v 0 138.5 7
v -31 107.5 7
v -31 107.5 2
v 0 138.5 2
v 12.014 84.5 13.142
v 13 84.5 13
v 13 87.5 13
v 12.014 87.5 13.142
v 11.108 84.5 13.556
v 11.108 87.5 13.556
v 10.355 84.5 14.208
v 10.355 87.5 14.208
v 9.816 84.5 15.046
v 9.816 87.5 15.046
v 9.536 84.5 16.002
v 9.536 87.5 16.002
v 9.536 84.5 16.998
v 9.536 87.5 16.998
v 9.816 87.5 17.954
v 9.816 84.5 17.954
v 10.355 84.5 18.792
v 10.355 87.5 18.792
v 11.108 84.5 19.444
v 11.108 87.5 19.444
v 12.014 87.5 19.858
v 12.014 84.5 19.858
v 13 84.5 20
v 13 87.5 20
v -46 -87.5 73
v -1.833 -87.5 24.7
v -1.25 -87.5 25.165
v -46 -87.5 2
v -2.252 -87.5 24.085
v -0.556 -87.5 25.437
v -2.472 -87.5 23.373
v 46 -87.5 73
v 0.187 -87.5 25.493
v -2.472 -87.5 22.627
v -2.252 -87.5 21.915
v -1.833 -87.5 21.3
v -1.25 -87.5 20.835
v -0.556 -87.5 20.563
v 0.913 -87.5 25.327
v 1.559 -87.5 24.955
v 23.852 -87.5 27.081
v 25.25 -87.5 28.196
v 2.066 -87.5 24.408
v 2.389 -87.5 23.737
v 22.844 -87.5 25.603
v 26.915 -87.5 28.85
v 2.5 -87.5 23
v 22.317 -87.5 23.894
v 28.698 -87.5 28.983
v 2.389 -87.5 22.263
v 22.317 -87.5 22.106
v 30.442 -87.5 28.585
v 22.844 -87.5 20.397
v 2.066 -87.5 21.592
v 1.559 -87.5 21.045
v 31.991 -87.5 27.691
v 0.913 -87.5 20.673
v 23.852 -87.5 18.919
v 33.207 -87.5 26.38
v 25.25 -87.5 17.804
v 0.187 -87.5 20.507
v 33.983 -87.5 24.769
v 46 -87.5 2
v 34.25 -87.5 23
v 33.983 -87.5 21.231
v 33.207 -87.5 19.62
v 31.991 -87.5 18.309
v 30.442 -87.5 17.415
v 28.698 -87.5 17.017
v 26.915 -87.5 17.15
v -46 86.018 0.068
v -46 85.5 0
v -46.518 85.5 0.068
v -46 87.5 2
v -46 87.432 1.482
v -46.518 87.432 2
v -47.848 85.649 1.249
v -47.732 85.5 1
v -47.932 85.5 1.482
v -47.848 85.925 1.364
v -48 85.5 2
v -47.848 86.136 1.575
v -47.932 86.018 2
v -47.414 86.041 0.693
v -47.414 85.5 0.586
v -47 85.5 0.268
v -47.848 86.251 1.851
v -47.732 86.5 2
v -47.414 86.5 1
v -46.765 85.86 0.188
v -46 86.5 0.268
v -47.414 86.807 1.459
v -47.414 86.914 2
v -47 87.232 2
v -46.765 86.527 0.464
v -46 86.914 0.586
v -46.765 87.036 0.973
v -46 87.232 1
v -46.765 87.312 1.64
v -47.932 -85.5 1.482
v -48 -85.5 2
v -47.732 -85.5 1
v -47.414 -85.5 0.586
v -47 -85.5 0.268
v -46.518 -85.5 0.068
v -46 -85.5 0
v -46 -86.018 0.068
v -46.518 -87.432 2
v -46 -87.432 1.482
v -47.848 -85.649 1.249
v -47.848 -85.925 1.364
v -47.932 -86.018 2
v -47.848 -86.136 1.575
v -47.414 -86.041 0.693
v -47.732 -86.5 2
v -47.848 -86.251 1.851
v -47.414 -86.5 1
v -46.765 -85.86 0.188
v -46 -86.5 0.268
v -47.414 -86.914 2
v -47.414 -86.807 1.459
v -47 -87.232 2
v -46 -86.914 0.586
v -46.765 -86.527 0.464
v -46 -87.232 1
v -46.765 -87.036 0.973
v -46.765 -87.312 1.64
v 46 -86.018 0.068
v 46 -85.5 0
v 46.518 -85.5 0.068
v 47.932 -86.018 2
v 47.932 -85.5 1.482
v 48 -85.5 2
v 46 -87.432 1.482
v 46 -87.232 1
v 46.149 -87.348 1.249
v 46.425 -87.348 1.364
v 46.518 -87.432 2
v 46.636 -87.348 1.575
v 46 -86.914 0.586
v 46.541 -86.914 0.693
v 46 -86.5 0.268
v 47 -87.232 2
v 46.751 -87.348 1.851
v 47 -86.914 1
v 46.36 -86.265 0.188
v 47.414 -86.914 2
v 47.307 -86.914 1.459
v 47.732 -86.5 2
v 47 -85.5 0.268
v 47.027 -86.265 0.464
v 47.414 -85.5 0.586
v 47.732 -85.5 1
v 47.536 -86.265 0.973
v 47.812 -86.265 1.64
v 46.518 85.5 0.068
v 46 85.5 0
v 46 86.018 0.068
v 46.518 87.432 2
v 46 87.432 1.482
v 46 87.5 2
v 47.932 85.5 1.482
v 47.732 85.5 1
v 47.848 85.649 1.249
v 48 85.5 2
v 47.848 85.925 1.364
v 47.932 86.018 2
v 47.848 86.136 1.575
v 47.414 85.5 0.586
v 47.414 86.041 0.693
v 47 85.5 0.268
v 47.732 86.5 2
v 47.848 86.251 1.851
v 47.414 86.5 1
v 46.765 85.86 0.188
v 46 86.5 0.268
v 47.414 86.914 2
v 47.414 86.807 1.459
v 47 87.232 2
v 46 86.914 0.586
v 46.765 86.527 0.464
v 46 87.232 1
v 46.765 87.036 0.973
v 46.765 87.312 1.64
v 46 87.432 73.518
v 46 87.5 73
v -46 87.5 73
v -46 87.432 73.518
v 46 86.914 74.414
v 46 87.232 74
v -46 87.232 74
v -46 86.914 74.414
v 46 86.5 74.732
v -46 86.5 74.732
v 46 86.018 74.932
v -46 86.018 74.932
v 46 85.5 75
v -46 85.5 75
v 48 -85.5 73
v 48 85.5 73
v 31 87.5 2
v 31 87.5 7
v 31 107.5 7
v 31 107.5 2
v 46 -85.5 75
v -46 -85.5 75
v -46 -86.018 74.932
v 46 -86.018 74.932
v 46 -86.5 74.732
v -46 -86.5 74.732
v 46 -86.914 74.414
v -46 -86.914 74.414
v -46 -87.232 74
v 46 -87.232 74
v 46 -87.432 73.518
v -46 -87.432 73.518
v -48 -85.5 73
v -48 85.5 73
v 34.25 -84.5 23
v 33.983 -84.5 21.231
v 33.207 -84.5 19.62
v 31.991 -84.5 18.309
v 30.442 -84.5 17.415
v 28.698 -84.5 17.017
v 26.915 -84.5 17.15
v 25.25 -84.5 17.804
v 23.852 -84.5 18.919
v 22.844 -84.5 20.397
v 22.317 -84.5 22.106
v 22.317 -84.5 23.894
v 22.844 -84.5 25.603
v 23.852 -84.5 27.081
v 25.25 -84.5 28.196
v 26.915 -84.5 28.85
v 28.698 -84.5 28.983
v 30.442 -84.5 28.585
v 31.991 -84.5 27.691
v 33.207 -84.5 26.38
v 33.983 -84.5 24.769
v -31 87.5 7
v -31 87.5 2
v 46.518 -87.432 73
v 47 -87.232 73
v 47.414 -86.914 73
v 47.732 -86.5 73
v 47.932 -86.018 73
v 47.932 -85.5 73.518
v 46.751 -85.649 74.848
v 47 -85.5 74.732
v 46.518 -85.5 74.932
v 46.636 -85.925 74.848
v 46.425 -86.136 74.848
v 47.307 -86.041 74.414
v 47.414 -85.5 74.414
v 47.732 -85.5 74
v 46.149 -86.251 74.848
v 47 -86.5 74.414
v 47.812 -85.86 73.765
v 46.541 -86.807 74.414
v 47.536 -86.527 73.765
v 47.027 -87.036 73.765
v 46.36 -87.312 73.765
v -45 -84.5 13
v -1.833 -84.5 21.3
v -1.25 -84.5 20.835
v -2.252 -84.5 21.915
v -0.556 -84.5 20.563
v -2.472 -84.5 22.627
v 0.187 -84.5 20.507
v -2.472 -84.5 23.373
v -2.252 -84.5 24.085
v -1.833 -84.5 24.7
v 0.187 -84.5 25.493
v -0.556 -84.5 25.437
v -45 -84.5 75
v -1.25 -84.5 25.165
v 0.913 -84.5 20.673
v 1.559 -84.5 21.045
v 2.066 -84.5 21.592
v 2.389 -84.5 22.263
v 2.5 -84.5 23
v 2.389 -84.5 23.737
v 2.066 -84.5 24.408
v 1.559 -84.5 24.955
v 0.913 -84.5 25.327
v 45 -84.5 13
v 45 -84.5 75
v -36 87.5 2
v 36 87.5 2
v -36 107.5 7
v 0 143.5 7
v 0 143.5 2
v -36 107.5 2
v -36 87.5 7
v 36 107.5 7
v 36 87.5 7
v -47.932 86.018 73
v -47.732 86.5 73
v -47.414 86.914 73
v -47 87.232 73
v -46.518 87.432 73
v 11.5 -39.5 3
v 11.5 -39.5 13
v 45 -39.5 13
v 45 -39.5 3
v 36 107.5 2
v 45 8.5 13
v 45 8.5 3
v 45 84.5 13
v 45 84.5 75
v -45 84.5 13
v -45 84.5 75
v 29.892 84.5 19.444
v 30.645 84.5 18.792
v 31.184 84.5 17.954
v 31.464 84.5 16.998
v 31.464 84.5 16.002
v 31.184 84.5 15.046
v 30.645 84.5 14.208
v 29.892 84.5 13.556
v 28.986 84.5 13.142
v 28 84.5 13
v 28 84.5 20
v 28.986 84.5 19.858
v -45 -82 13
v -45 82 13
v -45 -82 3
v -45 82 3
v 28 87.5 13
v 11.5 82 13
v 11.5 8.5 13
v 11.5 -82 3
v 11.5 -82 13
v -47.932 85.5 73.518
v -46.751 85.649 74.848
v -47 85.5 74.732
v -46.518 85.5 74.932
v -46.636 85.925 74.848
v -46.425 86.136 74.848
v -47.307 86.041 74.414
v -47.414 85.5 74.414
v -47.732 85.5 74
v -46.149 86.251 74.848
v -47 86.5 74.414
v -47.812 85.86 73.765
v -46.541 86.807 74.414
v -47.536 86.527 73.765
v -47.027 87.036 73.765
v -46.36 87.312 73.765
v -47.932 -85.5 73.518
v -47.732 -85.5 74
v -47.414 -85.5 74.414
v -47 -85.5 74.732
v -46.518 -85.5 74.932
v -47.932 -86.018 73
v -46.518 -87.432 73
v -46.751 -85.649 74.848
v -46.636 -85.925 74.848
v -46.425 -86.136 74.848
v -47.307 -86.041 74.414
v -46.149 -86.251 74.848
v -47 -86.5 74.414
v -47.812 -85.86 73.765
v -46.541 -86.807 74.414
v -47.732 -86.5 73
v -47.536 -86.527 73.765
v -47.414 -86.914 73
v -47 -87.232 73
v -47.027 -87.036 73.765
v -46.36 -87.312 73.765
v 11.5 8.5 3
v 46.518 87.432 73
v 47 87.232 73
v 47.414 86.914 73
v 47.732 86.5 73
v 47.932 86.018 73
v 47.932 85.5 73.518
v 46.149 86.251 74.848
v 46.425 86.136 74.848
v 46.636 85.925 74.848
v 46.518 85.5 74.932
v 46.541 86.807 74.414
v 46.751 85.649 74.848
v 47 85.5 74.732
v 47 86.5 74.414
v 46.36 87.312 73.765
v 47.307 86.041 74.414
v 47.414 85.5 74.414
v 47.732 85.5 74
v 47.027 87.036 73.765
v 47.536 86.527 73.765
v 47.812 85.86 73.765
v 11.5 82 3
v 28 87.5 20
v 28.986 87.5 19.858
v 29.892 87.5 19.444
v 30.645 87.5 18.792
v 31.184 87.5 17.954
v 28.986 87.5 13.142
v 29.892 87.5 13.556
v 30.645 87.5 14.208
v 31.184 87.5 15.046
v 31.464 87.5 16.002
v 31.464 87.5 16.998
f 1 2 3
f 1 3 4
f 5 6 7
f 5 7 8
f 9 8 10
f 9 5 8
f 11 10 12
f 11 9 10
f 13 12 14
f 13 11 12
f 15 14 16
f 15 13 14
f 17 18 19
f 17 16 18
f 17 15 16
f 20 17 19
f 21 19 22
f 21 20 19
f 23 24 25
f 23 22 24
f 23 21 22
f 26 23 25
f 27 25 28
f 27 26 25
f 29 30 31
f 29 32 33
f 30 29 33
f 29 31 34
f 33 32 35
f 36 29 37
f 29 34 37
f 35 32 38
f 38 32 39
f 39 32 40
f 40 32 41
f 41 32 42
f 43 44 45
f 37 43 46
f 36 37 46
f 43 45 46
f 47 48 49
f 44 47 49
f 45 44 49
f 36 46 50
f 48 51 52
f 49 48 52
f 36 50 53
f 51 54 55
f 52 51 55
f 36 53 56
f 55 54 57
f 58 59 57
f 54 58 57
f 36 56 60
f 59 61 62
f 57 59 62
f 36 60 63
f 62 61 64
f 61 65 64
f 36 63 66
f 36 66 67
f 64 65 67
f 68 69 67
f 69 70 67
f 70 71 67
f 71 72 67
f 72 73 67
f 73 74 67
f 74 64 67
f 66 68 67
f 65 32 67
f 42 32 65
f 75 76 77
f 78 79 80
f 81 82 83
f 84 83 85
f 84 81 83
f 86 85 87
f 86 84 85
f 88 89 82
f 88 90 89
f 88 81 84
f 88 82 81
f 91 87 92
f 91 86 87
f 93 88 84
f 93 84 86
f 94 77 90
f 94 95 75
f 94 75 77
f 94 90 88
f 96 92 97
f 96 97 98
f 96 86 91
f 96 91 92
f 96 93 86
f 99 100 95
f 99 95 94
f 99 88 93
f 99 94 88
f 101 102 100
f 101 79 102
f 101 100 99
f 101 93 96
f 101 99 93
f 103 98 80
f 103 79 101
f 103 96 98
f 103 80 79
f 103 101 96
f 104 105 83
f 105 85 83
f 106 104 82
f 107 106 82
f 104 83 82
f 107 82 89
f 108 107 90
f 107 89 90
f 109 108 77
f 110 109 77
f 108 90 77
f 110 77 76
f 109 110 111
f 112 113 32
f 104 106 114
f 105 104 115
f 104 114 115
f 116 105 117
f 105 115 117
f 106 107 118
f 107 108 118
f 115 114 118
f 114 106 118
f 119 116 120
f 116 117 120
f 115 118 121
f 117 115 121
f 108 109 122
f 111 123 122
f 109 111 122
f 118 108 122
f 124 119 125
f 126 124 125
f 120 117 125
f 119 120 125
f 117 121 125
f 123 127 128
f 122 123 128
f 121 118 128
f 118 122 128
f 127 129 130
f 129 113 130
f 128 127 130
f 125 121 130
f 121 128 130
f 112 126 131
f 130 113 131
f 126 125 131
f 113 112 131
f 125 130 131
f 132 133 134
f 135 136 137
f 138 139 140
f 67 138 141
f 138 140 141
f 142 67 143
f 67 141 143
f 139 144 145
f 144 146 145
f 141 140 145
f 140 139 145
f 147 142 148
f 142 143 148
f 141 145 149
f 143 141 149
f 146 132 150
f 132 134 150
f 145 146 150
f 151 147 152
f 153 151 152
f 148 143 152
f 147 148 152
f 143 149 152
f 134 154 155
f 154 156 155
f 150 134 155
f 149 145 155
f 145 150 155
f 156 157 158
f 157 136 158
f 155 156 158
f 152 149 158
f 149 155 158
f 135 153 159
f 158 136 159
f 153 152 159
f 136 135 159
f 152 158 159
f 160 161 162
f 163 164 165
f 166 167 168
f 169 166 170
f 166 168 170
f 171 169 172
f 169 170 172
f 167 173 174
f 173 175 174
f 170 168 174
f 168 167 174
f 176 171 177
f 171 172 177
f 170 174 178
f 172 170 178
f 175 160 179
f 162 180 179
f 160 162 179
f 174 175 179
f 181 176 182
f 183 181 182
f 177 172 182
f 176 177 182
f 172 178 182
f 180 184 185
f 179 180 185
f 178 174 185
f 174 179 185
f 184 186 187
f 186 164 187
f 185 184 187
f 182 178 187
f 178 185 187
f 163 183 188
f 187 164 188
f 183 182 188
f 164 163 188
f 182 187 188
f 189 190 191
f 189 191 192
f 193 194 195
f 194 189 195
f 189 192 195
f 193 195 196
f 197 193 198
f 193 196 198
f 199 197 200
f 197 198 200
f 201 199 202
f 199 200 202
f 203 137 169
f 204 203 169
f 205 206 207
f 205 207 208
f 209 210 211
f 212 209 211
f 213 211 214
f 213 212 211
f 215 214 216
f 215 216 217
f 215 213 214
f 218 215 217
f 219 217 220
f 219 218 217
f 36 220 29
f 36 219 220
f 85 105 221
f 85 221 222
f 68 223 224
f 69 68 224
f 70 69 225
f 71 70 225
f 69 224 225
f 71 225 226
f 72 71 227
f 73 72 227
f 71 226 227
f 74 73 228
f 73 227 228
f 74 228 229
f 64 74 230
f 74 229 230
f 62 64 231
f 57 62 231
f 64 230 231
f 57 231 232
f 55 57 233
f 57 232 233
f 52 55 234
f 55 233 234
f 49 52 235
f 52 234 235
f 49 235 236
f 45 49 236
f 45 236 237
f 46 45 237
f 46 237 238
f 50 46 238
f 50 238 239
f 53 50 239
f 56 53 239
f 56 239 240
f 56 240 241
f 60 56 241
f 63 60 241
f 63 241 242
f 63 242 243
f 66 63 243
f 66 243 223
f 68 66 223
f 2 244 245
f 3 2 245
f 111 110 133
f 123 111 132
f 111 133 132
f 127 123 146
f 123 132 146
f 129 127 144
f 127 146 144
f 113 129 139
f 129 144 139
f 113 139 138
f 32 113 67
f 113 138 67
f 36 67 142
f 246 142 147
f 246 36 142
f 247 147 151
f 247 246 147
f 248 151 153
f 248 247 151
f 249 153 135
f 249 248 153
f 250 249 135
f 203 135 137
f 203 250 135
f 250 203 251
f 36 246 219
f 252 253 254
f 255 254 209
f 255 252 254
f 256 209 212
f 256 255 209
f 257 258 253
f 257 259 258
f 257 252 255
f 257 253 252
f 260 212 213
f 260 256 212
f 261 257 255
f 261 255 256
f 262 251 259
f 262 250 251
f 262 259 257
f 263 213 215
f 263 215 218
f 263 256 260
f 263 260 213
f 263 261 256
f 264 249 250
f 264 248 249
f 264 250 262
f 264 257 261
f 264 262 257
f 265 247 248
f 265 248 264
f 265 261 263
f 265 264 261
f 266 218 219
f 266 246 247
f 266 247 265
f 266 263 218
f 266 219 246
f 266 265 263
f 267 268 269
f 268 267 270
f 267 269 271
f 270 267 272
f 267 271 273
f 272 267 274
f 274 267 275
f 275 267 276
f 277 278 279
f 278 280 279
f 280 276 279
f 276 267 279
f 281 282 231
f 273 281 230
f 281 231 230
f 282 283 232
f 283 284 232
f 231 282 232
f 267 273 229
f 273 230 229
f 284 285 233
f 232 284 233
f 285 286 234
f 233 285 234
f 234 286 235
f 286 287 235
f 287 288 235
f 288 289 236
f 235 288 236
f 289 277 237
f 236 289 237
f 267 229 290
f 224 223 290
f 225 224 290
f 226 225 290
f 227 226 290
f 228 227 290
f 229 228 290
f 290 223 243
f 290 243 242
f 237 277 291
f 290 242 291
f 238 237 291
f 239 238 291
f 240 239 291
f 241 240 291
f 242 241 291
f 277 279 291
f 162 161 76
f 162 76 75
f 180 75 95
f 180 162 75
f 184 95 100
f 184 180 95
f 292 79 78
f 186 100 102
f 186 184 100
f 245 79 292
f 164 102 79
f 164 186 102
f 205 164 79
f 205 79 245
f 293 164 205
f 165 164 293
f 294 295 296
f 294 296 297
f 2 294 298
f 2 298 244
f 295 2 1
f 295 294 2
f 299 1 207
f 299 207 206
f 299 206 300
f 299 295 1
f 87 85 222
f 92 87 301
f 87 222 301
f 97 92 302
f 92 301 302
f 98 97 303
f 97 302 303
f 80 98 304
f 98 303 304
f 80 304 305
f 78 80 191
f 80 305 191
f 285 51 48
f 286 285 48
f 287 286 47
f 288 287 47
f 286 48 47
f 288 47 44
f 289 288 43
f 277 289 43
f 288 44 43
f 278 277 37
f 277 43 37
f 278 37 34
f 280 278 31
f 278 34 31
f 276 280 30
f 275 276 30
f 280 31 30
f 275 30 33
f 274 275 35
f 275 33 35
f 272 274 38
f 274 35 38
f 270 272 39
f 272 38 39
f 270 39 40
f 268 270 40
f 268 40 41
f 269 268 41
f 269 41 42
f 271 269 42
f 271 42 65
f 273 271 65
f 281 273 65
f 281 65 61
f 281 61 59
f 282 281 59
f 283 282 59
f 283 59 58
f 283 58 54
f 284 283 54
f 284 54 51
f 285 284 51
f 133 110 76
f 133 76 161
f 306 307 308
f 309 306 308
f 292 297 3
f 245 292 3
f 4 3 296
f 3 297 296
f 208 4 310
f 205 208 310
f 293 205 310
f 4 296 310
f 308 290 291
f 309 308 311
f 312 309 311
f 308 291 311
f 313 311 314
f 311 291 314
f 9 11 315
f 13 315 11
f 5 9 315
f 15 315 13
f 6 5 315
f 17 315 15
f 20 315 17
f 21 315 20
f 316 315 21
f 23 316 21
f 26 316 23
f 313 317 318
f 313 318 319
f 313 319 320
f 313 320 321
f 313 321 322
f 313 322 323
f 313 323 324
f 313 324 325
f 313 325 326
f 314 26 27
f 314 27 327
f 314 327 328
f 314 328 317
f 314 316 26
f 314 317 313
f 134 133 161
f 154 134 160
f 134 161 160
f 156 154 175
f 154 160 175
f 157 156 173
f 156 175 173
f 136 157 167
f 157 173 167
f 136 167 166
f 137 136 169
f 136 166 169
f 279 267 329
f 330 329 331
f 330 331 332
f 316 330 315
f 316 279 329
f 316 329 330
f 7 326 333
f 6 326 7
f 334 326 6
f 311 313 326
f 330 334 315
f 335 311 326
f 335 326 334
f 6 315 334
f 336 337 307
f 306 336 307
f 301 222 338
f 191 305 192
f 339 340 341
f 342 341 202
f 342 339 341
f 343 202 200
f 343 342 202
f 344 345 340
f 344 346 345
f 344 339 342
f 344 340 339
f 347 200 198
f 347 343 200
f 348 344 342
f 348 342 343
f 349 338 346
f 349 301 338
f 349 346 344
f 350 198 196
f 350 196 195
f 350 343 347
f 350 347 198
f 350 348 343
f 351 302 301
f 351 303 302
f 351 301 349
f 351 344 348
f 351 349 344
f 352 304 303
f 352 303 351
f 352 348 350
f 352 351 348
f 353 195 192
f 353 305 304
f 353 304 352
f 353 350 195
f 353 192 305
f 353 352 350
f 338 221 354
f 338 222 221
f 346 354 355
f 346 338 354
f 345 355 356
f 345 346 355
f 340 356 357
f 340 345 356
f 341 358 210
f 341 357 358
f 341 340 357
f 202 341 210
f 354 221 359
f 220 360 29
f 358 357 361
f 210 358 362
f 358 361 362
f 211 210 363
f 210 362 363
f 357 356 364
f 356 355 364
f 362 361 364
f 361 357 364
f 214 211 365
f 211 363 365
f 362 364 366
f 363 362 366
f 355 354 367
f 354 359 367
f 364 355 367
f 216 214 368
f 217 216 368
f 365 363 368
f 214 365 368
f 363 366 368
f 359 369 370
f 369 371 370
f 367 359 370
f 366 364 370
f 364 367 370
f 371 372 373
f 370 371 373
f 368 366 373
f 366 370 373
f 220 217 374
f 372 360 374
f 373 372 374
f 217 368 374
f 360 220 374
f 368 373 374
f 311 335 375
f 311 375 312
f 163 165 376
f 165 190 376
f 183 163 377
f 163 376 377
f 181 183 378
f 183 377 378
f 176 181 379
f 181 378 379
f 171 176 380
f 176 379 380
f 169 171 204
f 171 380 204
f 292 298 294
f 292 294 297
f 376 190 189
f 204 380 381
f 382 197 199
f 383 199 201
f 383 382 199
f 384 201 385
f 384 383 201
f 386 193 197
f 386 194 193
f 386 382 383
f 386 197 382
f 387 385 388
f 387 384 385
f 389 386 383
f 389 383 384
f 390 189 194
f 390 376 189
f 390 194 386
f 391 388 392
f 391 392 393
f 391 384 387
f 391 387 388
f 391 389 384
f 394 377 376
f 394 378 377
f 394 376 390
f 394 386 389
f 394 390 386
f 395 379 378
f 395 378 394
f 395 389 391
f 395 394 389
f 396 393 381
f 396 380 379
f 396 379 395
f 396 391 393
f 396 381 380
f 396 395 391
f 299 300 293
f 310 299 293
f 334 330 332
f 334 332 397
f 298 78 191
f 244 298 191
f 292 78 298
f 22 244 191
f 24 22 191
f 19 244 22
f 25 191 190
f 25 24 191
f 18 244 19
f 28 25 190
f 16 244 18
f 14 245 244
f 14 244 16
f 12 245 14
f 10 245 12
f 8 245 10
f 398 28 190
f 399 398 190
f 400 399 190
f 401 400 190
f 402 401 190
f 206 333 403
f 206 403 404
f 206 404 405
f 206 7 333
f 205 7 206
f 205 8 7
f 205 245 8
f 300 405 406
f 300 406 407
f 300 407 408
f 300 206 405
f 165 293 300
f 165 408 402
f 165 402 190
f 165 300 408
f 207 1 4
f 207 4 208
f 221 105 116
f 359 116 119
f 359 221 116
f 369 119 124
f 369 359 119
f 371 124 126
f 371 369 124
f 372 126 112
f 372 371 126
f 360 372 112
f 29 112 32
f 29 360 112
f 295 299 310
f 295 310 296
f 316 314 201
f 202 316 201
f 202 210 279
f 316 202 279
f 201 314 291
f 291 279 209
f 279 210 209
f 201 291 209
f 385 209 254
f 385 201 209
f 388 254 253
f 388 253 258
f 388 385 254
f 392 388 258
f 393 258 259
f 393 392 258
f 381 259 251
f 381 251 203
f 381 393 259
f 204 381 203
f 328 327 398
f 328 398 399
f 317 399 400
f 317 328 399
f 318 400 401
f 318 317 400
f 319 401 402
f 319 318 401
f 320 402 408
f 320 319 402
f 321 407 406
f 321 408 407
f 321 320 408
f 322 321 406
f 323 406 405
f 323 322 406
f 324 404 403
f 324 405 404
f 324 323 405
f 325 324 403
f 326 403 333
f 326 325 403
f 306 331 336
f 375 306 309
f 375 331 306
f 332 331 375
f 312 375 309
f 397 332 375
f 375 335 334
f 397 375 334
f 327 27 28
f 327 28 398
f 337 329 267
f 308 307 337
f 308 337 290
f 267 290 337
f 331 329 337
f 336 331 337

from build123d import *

# Parameters (mm, degrees)
SKETCH1_W           = 96
SKETCH1_H           = 175
BOSS_EXTRUDE1_DEPTH = 100
SKETCH2_W           = 90
SKETCH2_H           = 169
CUT_EXTRUDE1_DEPTH  = 87
SKETCH3_W           = 56.5
SKETCH3_H           = 164
CUT_EXTRUDE2_DEPTH  = 10
SKETCH5_R           = 6
CUT_EXTRUDE3_DEPTH  = 10
SKETCH6_W           = 33.5
SKETCH6_H           = 48
CUT_EXTRUDE4_DEPTH  = 10
CUT_EXTRUDE6_DEPTH  = 10
SKETCH10_W          = 96
SKETCH10_H          = 25
CUT_EXTRUDE8_DEPTH  = 200
FILLET1_R           = 2
SKETCH11_R          = 2.5
CUT_EXTRUDE9_DEPTH  = 5
SKETCH12_W          = 5
SKETCH12_H          = 5
BOSS_EXTRUDE2_DEPTH = 20
BOSS_EXTRUDE5_DEPTH = 5


with BuildPart() as part:
    # Sketch1 → Boss-Extrude1 (new body)
    with BuildSketch(Plane.XY):
        Rectangle(SKETCH1_W, SKETCH1_H)
    extrude(amount=BOSS_EXTRUDE1_DEPTH)

    # Sketch2 → Cut-Extrude1 (cut)
    with BuildSketch(Plane.XY.offset(100)):
        Rectangle(SKETCH2_W, SKETCH2_H)
    extrude(amount=-CUT_EXTRUDE1_DEPTH, mode=Mode.SUBTRACT)

    # Sketch3 → Cut-Extrude2 (cut)
    with BuildSketch(Plane.XY.offset(13)):
        with Locations((-16.75, 0)):
            Rectangle(SKETCH3_W, SKETCH3_H)
    extrude(amount=-CUT_EXTRUDE2_DEPTH, mode=Mode.SUBTRACT)

    # Sketch5 → Cut-Extrude3 (cut)
    with BuildSketch(Plane(origin=(0, -84.5, 0), x_dir=(1, 0, 0), z_dir=(0, 1, 0))):
        with Locations((28.25, -23)):
            Circle(SKETCH5_R)
    extrude(amount=-CUT_EXTRUDE3_DEPTH, mode=Mode.SUBTRACT)

    # Sketch6 → Cut-Extrude4 (cut)
    with BuildSketch(Plane.XY.offset(13)):
        with Locations((28.25, -15.5)):
            Rectangle(SKETCH6_W, SKETCH6_H)
    extrude(amount=-CUT_EXTRUDE4_DEPTH, mode=Mode.SUBTRACT)

    # Sketch9 → Cut-Extrude6 (cut)
    with BuildSketch(Plane.XZ.offset(-84.5)):
        with BuildLine():
            Line((13, 20), (28, 20))
            ThreePointArc((28, 20), (31.5, 16.5), (28, 13))
            Line((28, 13), (13, 13))
            ThreePointArc((13, 13), (9.5, 16.5), (13, 20))
        make_face()
    extrude(amount=-CUT_EXTRUDE6_DEPTH, mode=Mode.SUBTRACT)

    # Sketch10 → Cut-Extrude8 (cut)
    with BuildSketch(Plane.XZ.offset(87.5)):
        with Locations((0, 87.5)):
            Rectangle(SKETCH10_W, SKETCH10_H)
    extrude(amount=-CUT_EXTRUDE8_DEPTH, mode=Mode.SUBTRACT)

    # Fillet1
    fillet1_edges = [part.edges().sort_by_distance(p)[0] for p in [
        (0, 87.5, 0),
        (48, 0, 0),
        (0, -87.5, 0),
        (-48, 0, 0),
        (-48, 87.5, 37.5),
        (48, 87.5, 37.5),
        (48, -87.5, 37.5),
        (-48, -87.5, 37.5),
        (-48, 0, 75),
        (0, 87.5, 75),
        (48, 0, 75),
        (0, -87.5, 75),
    ]]
    fillet(fillet1_edges, radius=FILLET1_R)

    # Sketch11 → Cut-Extrude9 (cut)
    with BuildSketch(Plane.XZ.offset(87.5)):
        with Locations((0, 23)):
            Circle(SKETCH11_R)
    extrude(amount=-CUT_EXTRUDE9_DEPTH, mode=Mode.SUBTRACT)

    # Sketch12 → Boss-Extrude2 (add)
    with BuildSketch(Plane(origin=(0, 87.5, 0), x_dir=(1, 0, 0), z_dir=(0, 1, 0))):
        with Locations((-33.5, -4.5)):
            Rectangle(SKETCH12_W, SKETCH12_H)
        with Locations((33.5, -4.5)):
            Rectangle(SKETCH12_W, SKETCH12_H)
    extrude(amount=BOSS_EXTRUDE2_DEPTH)

    # Sketch15 → Boss-Extrude5 (add)
    with BuildSketch(Plane.XY.offset(7)):
        Polygon((-31, 107.5), (0, 138.5), (31, 107.5), (36, 107.5), (0, 143.5), (-36, 107.5), align=None)
    extrude(amount=-BOSS_EXTRUDE5_DEPTH)


solid = part.part
